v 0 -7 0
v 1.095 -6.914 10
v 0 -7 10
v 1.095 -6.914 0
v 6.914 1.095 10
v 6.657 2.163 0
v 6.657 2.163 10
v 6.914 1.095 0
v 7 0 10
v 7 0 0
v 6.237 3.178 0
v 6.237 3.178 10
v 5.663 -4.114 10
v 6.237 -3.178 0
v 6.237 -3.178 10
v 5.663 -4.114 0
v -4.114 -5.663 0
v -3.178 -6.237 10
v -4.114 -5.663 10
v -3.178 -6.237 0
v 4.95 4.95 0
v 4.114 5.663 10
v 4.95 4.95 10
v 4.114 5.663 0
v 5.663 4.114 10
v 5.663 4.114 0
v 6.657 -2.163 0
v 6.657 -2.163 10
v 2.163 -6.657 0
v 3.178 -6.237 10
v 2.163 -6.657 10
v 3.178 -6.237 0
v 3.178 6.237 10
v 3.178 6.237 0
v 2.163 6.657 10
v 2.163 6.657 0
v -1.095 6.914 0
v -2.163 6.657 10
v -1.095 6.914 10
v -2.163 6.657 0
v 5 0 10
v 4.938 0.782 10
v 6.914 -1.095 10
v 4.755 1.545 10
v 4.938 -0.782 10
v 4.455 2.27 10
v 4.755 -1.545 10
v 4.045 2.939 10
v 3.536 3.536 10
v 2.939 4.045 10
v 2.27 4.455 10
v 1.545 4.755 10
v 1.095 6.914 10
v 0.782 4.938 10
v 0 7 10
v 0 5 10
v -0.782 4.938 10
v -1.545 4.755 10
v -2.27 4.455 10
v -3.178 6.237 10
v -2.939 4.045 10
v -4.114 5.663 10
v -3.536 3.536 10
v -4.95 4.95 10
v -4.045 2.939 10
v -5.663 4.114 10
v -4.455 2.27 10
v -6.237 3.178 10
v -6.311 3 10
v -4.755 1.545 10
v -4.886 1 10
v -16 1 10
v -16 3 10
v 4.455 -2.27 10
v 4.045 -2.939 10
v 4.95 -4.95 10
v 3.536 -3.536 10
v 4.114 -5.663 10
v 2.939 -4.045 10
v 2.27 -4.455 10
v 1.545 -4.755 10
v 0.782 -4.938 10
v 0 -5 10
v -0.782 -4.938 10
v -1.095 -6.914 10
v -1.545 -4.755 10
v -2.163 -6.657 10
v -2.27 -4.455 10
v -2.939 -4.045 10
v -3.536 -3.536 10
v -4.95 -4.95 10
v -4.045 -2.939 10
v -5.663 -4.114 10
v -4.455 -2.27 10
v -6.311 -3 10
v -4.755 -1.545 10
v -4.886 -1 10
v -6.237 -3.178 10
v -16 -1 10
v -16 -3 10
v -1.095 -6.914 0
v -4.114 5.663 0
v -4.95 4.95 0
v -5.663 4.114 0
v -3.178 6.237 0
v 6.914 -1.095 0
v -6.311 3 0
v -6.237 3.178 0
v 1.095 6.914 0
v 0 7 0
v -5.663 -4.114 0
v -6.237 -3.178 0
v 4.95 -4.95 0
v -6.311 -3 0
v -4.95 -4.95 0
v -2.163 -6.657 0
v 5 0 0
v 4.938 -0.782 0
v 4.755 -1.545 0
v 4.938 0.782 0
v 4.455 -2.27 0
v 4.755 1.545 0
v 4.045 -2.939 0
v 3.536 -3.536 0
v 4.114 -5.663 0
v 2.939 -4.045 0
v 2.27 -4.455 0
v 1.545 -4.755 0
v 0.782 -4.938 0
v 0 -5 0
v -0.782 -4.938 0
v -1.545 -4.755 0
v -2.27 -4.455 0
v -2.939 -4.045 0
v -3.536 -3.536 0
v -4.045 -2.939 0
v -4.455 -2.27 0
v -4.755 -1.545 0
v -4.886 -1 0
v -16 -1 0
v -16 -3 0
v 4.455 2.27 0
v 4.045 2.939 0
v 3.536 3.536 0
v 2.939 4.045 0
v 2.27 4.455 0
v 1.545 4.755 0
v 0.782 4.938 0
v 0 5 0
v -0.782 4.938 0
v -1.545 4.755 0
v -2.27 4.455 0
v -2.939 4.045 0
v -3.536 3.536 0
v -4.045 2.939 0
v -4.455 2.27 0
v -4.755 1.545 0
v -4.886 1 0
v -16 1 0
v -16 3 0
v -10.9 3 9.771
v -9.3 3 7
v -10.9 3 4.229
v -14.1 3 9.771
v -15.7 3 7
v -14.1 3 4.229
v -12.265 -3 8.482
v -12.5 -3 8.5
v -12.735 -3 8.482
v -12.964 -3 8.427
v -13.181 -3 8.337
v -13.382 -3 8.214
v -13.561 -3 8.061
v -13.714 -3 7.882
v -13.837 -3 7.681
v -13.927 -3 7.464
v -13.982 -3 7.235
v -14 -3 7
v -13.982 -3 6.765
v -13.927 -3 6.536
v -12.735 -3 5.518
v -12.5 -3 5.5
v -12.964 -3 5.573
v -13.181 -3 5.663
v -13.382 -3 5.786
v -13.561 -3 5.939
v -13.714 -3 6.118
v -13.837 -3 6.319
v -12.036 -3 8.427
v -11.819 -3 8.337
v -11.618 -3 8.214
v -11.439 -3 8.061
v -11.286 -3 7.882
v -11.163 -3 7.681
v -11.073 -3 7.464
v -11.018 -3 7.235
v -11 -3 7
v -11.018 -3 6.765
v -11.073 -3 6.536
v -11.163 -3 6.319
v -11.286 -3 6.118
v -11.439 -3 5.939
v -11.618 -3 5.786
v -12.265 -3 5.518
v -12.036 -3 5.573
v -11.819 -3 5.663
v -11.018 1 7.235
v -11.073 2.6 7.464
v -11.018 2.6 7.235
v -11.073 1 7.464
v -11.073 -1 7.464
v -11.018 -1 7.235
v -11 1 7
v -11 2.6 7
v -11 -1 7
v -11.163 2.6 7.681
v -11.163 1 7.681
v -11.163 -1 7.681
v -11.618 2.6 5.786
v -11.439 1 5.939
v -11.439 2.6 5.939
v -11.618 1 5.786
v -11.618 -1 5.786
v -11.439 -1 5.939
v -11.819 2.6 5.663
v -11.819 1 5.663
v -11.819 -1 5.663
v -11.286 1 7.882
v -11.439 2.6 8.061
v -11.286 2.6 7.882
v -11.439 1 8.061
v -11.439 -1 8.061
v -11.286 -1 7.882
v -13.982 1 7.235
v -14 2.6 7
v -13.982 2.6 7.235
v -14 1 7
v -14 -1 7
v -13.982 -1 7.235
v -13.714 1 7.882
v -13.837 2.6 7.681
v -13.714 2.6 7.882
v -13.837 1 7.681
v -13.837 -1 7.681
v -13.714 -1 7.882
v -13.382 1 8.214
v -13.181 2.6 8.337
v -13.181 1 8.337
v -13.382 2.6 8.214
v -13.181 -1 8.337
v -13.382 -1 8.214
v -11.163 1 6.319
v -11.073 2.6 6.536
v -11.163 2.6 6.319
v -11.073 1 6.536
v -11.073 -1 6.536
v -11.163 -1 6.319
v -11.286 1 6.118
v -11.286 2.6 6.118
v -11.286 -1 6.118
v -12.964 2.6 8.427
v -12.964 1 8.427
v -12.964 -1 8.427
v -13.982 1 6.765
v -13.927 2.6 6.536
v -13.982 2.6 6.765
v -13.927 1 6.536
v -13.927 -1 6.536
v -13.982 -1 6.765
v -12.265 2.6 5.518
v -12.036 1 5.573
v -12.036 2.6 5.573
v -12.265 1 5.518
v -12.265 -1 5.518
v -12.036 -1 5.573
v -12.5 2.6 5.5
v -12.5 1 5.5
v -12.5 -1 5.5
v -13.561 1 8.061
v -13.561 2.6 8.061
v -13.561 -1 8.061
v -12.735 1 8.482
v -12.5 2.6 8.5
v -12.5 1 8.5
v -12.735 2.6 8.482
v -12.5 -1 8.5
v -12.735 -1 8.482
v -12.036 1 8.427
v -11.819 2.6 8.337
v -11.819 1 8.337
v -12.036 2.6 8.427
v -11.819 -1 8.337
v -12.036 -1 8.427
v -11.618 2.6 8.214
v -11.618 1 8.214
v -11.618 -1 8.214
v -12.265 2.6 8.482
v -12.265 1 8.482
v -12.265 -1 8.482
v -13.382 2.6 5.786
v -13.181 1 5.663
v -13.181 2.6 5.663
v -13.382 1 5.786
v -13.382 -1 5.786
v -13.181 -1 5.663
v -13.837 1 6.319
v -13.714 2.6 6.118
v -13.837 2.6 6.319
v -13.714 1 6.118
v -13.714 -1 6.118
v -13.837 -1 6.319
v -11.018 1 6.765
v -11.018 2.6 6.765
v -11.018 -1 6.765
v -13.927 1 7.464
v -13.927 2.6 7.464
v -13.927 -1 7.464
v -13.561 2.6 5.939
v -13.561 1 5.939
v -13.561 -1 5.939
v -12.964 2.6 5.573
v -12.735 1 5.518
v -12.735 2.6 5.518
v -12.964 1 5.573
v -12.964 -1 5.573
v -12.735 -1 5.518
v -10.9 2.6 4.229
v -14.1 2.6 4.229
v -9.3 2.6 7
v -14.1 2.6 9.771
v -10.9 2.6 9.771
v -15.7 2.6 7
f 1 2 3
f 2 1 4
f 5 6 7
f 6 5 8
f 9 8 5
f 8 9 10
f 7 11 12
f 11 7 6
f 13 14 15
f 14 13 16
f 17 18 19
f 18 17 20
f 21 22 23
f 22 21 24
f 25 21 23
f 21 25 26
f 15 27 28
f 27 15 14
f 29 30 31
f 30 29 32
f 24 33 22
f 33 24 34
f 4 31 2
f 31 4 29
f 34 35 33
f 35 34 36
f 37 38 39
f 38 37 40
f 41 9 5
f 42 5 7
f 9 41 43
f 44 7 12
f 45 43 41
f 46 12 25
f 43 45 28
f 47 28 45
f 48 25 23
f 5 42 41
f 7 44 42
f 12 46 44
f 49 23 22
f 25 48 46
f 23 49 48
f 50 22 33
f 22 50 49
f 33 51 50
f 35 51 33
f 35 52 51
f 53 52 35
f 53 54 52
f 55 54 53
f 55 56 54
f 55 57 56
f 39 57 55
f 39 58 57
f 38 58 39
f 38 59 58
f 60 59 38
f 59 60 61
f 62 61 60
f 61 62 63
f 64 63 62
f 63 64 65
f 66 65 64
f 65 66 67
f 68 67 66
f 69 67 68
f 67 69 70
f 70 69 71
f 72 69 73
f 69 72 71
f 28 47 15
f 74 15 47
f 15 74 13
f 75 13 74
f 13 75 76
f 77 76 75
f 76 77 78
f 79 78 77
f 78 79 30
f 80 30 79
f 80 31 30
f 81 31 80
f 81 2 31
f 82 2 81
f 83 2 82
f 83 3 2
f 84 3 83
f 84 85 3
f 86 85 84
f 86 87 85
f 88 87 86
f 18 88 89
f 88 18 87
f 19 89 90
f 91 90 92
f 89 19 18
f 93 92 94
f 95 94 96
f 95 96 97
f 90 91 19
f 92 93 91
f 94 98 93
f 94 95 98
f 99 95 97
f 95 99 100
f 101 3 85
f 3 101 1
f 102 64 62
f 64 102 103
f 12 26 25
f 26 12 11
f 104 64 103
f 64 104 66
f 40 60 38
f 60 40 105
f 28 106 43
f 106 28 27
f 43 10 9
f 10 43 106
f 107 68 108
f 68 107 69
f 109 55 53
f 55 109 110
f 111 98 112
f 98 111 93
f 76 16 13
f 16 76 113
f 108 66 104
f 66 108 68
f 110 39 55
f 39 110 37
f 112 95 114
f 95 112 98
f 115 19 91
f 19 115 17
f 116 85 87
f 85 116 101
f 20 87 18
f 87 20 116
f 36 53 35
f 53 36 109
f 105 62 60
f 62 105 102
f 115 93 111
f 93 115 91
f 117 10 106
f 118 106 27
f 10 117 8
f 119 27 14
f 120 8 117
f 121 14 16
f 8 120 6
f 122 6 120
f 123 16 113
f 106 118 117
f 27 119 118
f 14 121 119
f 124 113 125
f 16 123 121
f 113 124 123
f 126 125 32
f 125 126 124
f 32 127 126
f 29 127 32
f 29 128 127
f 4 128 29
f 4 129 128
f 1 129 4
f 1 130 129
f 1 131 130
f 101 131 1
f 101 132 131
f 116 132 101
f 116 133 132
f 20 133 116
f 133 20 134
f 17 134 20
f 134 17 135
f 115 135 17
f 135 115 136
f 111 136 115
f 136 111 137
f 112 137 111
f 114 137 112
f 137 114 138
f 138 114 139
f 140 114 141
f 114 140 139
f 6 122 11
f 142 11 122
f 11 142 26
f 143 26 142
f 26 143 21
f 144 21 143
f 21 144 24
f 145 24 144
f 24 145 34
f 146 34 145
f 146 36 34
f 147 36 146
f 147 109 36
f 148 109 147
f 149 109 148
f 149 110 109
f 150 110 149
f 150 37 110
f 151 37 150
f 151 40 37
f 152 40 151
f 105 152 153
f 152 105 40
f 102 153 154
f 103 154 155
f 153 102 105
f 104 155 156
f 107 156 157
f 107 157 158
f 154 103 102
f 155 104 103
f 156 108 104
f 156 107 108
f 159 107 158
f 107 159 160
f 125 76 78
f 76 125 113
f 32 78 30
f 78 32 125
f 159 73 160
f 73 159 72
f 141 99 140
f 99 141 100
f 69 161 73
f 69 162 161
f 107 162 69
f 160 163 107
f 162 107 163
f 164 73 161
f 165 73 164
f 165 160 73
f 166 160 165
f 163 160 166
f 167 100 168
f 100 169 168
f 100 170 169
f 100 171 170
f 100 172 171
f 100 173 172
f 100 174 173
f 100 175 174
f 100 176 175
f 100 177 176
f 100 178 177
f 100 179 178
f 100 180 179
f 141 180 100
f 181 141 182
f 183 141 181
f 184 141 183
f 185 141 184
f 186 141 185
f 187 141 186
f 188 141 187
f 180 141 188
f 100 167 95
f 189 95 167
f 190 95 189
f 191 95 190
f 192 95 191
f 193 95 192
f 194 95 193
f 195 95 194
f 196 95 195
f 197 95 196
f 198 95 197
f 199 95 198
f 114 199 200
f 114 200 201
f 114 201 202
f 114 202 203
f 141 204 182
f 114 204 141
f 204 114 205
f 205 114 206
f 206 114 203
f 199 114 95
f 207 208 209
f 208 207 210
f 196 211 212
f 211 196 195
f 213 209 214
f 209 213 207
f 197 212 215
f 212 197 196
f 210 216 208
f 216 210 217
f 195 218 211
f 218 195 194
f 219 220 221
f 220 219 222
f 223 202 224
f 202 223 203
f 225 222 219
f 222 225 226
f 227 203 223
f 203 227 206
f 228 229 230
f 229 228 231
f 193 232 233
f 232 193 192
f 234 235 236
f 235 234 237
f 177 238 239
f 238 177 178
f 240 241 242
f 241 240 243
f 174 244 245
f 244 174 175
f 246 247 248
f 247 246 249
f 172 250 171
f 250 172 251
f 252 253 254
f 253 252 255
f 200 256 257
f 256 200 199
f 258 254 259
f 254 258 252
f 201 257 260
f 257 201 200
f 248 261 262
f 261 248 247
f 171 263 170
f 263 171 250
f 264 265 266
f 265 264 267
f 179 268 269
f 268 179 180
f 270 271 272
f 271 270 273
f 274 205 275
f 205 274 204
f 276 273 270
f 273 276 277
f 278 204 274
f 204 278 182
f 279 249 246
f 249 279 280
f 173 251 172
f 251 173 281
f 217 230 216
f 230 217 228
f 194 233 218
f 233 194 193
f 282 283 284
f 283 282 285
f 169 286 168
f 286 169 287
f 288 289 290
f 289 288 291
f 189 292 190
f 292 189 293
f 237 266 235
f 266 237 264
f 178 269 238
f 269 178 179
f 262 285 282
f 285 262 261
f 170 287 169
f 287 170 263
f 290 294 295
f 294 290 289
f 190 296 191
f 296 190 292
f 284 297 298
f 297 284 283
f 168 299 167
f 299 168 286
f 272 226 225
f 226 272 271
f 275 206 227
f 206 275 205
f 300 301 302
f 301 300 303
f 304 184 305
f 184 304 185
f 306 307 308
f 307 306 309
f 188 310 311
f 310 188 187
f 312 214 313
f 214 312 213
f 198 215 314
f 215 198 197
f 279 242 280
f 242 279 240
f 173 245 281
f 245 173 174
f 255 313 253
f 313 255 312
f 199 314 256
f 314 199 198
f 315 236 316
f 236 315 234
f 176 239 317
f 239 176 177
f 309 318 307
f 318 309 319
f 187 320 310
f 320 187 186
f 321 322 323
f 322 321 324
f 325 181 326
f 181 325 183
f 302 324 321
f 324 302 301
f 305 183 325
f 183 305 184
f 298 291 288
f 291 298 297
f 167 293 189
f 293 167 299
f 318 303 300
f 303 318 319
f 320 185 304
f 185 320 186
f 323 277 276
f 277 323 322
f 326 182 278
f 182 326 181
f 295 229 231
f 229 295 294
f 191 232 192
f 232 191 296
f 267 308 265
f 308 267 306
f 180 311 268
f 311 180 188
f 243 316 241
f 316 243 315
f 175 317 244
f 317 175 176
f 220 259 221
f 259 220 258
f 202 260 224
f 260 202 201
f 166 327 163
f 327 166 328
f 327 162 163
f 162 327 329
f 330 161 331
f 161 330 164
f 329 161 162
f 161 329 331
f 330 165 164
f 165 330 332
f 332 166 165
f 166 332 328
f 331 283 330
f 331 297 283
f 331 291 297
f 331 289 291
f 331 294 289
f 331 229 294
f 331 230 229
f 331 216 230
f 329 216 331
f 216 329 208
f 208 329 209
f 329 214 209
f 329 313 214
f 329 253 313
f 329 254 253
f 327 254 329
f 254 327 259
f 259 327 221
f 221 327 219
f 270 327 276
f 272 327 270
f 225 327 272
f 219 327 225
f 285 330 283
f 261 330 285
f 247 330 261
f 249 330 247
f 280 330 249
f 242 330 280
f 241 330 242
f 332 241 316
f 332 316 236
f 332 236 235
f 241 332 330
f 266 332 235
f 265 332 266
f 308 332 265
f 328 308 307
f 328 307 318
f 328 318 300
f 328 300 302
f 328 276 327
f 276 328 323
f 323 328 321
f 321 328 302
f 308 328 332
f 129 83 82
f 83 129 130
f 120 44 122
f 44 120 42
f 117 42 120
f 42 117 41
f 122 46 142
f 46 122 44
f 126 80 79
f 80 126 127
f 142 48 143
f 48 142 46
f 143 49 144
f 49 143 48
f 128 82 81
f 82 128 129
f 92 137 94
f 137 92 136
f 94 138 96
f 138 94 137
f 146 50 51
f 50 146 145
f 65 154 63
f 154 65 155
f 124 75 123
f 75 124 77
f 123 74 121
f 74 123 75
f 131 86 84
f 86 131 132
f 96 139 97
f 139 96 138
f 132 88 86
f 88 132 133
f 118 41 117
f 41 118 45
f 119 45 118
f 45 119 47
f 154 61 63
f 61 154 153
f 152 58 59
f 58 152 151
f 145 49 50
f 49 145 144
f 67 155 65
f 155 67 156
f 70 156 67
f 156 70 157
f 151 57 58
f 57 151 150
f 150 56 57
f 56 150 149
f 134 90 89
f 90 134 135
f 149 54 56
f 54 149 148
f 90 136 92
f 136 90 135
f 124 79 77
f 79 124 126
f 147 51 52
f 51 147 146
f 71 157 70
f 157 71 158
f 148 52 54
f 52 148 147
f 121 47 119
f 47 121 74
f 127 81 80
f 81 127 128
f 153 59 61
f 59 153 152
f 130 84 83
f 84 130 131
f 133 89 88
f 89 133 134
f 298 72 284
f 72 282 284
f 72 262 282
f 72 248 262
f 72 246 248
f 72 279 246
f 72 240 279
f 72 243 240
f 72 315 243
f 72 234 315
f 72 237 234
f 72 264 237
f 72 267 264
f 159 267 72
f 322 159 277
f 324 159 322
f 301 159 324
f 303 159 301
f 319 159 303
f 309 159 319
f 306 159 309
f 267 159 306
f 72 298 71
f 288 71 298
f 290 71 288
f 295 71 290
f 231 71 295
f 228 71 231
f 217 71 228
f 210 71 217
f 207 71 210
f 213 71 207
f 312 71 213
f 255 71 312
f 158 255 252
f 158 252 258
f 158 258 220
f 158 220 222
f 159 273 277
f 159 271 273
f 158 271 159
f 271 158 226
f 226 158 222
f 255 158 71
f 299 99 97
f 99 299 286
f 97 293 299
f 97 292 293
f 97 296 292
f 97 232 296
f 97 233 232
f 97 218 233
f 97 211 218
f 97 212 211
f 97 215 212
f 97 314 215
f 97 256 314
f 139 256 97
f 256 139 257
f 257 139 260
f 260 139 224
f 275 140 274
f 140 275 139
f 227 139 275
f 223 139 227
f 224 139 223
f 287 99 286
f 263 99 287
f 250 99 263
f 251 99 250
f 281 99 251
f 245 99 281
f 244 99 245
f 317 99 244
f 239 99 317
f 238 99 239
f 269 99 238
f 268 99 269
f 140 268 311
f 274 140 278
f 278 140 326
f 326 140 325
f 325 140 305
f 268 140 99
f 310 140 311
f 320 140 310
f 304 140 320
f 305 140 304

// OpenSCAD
use <MCAD/nuts_and_bolts.scad>

$fn = 40;

module lock_ring(
	plus=true,
	wall=2,
	hrod_lock_d=14,
	hrod_lock_sz_z=10,
	vrod_d = 10,
  bolt_d=3
		) {
	if(plus) {
		union() {
			cylinder(d=hrod_lock_d, h=hrod_lock_sz_z);
			translate([-hrod_lock_d-wall, -wall*1.5, 0]) {
				cube([hrod_lock_d+wall, 3*wall, hrod_lock_sz_z]);
			}
		}
	} else {
		cylinder(d=vrod_d, h=hrod_lock_sz_z);
		translate([-hrod_lock_d-wall, -wall*0.5, 0]) {
			cube([hrod_lock_d+wall, wall, hrod_lock_sz_z]);
		}
		// bolt hole
		translate([-hrod_lock_d+bolt_d/2, hrod_lock_d*3/2, hrod_lock_d/2]) {
			rotate([90, 0, 0]) {
				cylinder(d=bolt_d, h=hrod_lock_d*3);
				translate([0, 0, hrod_lock_d*3/2-wall*2-1]) {
					nutHole(3);
				}
			}
		}
	}
}

difference() {
  lock_ring(plus=true);
  lock_ring(plus=false);
}
